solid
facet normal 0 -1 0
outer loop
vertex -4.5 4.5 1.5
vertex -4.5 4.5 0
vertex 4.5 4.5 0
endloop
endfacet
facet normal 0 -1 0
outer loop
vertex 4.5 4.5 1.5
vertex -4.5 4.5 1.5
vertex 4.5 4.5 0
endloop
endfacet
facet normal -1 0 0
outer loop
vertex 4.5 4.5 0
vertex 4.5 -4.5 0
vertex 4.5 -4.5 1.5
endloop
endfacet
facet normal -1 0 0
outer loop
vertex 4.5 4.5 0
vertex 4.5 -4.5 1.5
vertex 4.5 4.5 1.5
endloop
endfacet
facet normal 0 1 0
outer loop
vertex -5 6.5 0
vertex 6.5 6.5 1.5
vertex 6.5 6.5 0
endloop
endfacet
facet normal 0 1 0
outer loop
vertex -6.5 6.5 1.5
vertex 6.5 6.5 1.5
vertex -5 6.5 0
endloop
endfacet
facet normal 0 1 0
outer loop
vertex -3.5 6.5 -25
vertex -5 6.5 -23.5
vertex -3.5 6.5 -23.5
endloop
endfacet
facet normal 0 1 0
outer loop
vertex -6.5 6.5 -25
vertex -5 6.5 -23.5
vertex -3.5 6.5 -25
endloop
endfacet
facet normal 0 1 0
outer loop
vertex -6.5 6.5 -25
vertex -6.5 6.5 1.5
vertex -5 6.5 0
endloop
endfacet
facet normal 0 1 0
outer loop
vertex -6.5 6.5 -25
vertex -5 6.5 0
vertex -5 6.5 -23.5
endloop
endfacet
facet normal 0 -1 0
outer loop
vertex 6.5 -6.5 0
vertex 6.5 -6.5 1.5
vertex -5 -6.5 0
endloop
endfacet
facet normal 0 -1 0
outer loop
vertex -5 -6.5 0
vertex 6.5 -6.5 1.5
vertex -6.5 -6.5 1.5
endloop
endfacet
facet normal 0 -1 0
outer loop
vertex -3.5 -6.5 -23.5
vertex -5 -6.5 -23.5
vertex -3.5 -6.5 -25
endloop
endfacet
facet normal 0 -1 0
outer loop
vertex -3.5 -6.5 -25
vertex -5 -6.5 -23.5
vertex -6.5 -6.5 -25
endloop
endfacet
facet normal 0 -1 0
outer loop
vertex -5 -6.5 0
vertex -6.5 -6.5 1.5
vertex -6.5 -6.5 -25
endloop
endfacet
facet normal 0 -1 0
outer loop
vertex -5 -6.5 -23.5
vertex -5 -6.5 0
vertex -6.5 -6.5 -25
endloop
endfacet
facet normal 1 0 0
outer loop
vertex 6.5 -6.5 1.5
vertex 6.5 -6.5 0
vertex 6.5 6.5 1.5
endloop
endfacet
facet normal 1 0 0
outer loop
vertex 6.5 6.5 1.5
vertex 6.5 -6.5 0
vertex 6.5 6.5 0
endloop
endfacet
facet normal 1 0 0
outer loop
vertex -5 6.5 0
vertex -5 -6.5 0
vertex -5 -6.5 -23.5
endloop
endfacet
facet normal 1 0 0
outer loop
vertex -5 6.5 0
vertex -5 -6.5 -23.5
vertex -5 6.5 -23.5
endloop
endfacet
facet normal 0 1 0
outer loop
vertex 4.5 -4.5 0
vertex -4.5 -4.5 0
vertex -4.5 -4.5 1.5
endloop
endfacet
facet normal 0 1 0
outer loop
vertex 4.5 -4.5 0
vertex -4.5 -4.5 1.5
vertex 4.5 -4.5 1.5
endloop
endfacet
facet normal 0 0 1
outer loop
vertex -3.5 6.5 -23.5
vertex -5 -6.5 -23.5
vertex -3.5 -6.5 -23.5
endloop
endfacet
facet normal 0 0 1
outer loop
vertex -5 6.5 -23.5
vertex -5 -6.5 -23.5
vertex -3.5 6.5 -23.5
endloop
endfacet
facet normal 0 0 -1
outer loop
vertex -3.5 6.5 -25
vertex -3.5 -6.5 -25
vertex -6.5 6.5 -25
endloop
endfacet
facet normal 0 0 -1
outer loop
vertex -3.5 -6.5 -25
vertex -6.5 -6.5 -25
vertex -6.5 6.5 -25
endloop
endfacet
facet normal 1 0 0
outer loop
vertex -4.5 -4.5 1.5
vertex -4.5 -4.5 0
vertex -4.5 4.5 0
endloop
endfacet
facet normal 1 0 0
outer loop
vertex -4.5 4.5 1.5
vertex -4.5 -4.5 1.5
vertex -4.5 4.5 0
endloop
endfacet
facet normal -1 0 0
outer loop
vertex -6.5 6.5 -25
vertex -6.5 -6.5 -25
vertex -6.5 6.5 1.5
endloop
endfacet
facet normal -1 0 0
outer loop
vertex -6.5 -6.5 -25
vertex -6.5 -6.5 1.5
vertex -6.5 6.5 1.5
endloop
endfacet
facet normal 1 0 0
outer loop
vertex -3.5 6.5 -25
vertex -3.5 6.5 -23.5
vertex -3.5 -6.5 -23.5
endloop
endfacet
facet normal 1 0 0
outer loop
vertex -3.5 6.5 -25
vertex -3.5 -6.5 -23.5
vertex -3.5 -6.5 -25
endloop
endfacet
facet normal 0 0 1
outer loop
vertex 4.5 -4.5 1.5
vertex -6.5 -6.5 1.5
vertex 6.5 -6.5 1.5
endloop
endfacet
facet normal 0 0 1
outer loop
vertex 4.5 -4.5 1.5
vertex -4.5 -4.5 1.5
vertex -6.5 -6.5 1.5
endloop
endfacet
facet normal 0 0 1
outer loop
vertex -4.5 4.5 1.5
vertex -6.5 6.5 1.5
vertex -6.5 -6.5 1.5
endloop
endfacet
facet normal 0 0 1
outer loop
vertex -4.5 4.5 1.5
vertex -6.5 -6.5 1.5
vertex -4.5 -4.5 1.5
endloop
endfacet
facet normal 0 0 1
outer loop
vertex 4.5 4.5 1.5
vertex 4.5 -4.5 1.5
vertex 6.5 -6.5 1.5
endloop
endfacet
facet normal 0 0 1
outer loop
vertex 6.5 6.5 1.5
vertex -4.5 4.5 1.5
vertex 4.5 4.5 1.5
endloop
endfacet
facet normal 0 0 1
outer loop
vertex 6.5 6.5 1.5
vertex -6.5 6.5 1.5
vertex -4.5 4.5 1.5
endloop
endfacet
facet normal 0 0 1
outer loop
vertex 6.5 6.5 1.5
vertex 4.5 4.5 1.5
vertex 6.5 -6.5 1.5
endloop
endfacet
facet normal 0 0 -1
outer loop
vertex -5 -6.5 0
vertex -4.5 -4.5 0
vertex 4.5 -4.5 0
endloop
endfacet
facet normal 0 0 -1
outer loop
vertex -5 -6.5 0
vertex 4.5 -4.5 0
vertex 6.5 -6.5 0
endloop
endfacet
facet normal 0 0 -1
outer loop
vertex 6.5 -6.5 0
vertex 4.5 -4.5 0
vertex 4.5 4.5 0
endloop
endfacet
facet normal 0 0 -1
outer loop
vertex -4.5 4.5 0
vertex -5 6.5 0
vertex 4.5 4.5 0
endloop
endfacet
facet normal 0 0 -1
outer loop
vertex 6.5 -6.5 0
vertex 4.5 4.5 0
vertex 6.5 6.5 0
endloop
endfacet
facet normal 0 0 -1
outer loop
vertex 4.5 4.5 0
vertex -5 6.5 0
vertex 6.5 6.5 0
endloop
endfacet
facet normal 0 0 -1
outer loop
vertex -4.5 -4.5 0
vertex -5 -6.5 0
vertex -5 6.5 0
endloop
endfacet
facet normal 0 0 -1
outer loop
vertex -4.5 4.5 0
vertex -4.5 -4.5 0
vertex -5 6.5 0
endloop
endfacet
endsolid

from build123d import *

# Parameters (mm, degrees)
SKETCH1_W           = 13
SKETCH1_H           = 13
SKETCH1_W_2         = 9
SKETCH1_H_2         = 9
BOSS_EXTRUDE1_DEPTH = 1.5
SKETCH2_W           = 1.5
SKETCH2_H           = 13
BOSS_EXTRUDE2_DEPTH = 25
SKETCH3_W           = 1.5
SKETCH3_H           = 13
BOSS_EXTRUDE3_DEPTH = 1.5


with BuildPart() as part:
    # Sketch1 → Boss-Extrude1 (new body)
    with BuildSketch(Plane.XY):
        Rectangle(SKETCH1_W, SKETCH1_H)
        Rectangle(SKETCH1_W_2, SKETCH1_H_2, mode=Mode.SUBTRACT)
    extrude(amount=BOSS_EXTRUDE1_DEPTH)

    # Sketch2 → Boss-Extrude2 (add)
    with BuildSketch(Plane(origin=(0, 0, 0), x_dir=(-1, 0, 0), z_dir=(0, 0, -1))):
        with Locations((5.75, 0)):
            Rectangle(SKETCH2_W, SKETCH2_H)
    extrude(amount=BOSS_EXTRUDE2_DEPTH)

    # Sketch3 → Boss-Extrude3 (add)
    with BuildSketch(Plane(origin=(-5, 0, 0), x_dir=(0, 0, -1), z_dir=(1, 0, 0))):
        with Locations((24.25, 0)):
            Rectangle(SKETCH3_W, SKETCH3_H)
    extrude(amount=BOSS_EXTRUDE3_DEPTH)


solid = part.part
